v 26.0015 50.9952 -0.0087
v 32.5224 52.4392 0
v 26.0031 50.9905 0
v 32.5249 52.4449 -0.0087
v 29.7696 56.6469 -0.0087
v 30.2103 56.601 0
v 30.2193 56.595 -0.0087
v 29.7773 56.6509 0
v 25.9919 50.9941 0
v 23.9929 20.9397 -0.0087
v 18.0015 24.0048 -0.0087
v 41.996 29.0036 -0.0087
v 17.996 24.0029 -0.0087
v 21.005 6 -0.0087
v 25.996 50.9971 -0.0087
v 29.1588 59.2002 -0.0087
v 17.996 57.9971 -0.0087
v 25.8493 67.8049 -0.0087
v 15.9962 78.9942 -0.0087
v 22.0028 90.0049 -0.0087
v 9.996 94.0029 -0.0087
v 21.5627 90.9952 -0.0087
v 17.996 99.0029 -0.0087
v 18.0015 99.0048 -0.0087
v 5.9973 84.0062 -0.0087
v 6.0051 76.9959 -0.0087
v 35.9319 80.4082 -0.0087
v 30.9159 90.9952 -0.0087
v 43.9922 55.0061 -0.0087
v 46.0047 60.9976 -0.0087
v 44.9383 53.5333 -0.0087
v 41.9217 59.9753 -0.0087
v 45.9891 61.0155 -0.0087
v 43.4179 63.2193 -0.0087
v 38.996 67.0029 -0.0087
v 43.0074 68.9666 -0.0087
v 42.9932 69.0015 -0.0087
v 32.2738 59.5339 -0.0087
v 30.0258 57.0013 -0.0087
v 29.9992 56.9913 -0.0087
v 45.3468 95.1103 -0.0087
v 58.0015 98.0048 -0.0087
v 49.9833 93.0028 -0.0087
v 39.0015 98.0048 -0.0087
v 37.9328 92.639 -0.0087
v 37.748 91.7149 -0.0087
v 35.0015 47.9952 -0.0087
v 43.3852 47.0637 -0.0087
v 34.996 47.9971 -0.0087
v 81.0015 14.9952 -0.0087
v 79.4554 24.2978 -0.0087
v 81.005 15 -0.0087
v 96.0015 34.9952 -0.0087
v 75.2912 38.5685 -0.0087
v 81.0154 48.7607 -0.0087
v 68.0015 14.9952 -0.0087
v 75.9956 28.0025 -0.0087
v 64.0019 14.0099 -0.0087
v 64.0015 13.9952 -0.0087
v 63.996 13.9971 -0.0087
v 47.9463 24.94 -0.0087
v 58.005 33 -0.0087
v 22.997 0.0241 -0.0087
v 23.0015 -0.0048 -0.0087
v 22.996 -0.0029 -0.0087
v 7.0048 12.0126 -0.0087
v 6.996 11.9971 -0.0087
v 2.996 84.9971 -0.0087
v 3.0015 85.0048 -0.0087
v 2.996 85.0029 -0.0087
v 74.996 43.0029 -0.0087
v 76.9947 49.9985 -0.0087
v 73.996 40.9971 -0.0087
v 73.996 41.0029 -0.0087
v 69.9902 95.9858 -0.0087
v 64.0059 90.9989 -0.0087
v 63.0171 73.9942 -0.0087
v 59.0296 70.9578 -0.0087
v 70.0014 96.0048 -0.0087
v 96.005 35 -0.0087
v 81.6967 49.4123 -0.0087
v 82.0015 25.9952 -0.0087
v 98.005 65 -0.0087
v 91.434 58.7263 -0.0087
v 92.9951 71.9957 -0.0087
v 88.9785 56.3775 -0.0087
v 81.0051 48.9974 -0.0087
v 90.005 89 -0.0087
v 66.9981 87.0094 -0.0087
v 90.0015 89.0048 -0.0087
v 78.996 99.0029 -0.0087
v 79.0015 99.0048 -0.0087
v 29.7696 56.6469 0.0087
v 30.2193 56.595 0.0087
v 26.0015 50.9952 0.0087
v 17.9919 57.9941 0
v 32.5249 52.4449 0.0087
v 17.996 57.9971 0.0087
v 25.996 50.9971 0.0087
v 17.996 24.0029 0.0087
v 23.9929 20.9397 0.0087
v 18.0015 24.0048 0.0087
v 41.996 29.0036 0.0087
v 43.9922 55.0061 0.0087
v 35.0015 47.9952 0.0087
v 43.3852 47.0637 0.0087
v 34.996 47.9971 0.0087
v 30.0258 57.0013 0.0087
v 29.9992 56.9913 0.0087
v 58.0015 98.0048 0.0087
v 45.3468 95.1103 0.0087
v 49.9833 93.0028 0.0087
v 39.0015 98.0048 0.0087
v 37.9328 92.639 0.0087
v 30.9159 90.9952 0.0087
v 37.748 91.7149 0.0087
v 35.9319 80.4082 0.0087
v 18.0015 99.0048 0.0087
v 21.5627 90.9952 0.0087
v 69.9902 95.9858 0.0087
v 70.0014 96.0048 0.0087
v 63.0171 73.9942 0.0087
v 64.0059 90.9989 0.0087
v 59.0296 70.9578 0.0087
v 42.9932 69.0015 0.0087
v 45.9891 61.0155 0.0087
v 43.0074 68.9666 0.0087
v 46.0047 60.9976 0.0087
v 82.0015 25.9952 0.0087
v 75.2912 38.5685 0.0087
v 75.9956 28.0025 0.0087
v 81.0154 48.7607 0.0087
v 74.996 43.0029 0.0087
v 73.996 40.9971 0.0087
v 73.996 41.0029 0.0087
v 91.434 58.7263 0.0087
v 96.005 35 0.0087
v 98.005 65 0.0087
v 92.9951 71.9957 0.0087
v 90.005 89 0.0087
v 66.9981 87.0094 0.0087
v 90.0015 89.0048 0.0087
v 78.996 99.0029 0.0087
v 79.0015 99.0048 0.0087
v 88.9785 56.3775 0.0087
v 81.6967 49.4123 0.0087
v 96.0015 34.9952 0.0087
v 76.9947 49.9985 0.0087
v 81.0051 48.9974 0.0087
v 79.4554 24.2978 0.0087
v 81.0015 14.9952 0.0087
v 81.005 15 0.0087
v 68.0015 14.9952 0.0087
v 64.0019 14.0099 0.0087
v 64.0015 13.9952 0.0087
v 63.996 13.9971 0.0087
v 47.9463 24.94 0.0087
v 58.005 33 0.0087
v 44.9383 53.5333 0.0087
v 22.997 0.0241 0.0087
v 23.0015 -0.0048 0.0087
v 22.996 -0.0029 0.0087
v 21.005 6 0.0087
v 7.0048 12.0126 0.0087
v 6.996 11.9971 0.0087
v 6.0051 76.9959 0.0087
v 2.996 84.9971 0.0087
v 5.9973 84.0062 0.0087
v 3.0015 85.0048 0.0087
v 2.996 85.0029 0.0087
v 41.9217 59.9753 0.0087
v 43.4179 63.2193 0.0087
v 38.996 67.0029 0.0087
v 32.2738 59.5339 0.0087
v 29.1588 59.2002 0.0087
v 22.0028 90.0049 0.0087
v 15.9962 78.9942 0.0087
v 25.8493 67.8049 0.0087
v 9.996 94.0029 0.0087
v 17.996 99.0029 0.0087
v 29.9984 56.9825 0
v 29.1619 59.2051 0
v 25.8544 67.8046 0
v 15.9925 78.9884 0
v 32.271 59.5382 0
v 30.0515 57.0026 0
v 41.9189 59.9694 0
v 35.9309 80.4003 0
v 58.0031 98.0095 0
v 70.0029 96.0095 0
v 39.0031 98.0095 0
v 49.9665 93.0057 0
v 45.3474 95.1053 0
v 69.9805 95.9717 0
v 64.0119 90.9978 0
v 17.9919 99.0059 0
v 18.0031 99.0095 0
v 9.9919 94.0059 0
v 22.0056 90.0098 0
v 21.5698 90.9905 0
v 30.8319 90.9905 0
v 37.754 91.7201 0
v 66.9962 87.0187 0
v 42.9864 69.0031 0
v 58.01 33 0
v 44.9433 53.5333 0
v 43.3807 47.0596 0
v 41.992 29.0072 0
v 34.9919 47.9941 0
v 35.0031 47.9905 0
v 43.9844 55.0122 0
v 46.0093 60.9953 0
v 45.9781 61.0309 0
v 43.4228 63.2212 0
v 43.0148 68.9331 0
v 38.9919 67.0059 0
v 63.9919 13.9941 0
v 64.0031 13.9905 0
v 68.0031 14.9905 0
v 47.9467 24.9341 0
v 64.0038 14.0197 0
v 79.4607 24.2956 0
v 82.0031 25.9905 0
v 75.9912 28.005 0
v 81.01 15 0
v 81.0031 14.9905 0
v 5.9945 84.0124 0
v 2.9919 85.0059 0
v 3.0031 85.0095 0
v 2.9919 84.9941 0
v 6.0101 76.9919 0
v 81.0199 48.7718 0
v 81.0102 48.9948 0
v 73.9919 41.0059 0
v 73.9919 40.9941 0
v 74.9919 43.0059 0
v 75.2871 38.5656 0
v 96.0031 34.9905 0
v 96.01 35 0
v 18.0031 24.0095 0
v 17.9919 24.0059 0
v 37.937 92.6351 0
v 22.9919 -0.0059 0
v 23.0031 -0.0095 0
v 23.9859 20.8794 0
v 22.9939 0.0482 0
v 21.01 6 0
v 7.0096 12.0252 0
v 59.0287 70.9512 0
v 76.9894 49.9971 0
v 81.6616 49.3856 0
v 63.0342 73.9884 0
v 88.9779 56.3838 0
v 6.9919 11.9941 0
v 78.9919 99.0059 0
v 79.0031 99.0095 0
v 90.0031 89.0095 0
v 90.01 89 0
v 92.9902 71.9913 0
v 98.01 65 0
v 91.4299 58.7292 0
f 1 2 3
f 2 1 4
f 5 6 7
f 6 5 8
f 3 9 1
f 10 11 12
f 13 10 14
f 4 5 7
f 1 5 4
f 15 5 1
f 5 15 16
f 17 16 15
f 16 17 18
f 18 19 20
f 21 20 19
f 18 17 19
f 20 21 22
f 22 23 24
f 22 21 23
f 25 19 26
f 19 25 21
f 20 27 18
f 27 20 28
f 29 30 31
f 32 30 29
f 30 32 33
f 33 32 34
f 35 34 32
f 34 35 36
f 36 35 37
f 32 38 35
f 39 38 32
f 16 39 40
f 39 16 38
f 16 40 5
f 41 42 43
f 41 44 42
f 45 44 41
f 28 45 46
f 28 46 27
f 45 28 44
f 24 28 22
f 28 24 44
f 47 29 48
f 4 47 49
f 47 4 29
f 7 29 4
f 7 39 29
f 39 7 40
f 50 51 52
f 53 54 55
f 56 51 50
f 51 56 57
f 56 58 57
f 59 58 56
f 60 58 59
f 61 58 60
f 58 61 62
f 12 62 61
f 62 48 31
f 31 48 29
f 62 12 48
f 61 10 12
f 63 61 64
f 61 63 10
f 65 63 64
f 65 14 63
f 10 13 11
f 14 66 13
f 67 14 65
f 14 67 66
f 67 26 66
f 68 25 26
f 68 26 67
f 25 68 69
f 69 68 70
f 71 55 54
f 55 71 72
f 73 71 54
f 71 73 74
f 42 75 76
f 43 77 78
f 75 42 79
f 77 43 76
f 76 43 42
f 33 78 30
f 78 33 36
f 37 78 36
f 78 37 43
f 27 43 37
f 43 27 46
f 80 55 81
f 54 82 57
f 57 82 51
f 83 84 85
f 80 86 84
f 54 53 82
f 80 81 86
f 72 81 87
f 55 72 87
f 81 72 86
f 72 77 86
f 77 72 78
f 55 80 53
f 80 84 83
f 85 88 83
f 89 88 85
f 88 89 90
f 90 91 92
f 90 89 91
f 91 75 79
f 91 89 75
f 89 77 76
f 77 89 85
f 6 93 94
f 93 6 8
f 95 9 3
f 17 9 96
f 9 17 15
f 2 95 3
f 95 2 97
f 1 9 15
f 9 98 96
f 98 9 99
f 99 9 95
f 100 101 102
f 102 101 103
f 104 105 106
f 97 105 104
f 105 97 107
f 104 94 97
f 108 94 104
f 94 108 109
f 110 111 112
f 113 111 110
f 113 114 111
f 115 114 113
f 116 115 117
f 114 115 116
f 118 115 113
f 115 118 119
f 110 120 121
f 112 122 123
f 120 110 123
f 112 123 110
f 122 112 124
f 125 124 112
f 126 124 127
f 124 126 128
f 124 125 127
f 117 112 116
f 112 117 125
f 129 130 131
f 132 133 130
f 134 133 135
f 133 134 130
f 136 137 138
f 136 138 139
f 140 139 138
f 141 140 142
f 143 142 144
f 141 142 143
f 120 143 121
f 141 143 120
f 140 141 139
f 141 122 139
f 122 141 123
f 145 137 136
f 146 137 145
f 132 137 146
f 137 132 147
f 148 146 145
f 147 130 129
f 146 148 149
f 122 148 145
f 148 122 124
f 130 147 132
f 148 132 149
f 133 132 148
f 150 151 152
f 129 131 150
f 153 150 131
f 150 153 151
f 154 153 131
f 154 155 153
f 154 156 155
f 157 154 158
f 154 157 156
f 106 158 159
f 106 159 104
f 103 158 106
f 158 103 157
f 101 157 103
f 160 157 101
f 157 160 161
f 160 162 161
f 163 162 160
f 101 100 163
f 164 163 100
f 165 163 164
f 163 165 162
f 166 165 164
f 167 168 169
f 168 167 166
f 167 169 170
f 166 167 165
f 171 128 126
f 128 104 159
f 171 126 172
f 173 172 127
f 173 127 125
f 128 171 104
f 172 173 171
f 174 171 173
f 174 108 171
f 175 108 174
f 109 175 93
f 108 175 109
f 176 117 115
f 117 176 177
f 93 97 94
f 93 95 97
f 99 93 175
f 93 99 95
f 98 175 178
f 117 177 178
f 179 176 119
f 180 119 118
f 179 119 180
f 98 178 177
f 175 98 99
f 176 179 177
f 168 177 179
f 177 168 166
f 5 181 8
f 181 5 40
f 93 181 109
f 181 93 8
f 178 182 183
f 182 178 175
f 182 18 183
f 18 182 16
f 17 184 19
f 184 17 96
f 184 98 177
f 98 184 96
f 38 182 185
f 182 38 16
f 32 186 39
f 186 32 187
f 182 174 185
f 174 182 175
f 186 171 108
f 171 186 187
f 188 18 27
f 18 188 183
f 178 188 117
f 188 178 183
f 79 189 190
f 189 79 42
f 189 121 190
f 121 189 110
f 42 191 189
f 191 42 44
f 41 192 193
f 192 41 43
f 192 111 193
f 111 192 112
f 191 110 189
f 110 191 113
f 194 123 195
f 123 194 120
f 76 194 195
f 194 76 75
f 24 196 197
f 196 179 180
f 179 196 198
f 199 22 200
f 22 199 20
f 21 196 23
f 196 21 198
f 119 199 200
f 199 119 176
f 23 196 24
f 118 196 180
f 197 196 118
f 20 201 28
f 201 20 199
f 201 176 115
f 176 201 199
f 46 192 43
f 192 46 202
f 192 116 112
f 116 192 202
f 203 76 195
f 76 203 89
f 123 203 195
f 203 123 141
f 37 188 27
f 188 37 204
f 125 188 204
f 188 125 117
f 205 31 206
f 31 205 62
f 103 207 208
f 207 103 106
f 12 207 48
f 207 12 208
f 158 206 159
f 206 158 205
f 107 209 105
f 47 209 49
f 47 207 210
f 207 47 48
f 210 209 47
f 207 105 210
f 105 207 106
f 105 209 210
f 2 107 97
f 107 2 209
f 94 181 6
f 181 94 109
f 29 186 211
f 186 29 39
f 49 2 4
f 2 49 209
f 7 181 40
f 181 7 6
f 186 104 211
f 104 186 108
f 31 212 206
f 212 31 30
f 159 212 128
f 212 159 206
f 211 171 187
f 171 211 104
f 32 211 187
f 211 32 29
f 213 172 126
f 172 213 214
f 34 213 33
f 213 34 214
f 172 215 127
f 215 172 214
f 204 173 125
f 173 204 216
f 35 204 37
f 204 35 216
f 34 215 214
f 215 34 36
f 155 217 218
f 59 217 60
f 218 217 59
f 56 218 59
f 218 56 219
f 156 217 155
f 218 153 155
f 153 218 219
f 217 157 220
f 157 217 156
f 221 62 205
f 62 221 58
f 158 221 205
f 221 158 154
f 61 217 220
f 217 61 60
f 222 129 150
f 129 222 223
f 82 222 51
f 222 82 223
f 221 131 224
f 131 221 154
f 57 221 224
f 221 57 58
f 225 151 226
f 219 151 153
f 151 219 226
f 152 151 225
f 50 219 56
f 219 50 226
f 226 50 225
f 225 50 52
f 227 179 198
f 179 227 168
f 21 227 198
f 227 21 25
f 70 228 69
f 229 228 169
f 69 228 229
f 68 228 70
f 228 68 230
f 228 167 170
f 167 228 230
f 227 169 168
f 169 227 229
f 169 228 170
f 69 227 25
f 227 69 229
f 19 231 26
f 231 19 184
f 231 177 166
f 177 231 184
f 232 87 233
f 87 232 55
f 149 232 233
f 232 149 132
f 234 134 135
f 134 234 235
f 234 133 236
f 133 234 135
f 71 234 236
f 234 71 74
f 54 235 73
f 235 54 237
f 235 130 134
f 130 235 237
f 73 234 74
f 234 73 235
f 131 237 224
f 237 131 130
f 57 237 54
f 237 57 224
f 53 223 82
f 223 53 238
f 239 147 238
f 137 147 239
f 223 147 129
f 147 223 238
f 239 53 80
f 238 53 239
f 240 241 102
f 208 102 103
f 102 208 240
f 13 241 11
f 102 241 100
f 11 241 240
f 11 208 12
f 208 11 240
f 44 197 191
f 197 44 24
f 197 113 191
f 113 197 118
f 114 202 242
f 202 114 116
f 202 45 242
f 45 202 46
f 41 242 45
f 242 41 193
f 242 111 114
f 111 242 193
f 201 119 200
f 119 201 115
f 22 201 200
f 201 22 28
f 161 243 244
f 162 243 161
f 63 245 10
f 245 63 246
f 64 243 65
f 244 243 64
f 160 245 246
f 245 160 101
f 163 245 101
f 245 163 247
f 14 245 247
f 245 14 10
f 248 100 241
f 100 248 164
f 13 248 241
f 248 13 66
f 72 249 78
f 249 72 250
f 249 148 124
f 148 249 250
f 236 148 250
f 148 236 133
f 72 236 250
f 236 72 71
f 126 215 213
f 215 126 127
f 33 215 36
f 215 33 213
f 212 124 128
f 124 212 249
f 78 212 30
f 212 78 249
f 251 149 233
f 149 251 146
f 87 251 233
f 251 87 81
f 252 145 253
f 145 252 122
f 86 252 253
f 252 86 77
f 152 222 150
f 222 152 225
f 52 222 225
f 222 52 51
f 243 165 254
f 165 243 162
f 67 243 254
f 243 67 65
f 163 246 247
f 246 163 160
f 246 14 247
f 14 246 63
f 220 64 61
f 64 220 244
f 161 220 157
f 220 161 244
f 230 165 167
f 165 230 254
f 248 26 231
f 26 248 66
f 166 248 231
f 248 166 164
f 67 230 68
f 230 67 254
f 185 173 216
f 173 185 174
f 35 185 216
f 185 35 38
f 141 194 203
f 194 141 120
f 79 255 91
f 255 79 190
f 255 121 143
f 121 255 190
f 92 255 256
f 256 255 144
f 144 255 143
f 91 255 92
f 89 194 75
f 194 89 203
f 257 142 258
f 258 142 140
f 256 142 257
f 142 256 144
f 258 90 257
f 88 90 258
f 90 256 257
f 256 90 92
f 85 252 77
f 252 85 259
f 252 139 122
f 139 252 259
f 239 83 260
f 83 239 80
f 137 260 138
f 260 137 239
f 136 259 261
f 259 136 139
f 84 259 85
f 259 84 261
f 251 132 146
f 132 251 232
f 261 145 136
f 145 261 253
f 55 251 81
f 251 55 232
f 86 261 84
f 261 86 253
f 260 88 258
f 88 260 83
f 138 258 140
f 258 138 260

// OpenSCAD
color([0.592053202978914,0.7602792343344718,0.23214841748979886]) hull(){
    translate([18,58]) sphere(0.01);
    translate([44,55]) sphere(0.01);
    translate([26,51]) sphere(0.01);
}
color([0.2215781656479593,0.24536616409996503,0.7021925659500807]) hull(){
    translate([18,58]) sphere(0.01);
    translate([26,51]) sphere(0.01);
    translate([30,57]) sphere(0.01);
}
color([0.5457605096294114,0.54011508338913,0.5459453680001618]) hull(){
    translate([18,58]) sphere(0.01);
    translate([20,83]) sphere(0.01);
    translate([30,57]) sphere(0.01);
}
color([0.21439919344985514,0.4167057873106884,0.6193494045718565]) hull(){
    translate([18,58]) sphere(0.01);
    translate([20,83]) sphere(0.01);
    translate([16,79]) sphere(0.01);
}
color([0.45760594266221877,0.8933837090972113,0.8109172526149769]) hull(){
    translate([18,58]) sphere(0.01);
    translate([30,57]) sphere(0.01);
    translate([46,61]) sphere(0.01);
}
color([0.14833972802097417,0.6068004170768148,0.5080529466064481]) hull(){
    translate([18,58]) sphere(0.01);
    translate([16,79]) sphere(0.01);
    translate([38,83]) sphere(0.01);
}
color([0.9906187087676633,0.11352393843166497,0.6883720652754897]) hull(){
    translate([18,58]) sphere(0.01);
    translate([38,83]) sphere(0.01);
    translate([20,83]) sphere(0.01);
}
color([0.5952346609945763,0.6540807806784664,0.3474259839548979]) hull(){
    translate([58,98]) sphere(0.01);
    translate([50,93]) sphere(0.01);
    translate([70,96]) sphere(0.01);
}
color([0.9928586924360654,0.247192741454632,0.70975753974483]) hull(){
    translate([58,98]) sphere(0.01);
    translate([50,93]) sphere(0.01);
    translate([64,91]) sphere(0.01);
}
color([0.13794757021236903,0.4611444179186315,0.04899626755467579]) hull(){
    translate([58,98]) sphere(0.01);
    translate([39,98]) sphere(0.01);
    translate([50,93]) sphere(0.01);
}
color([0.1977229983916683,0.036370797334404625,0.13840798504488894]) hull(){
    translate([58,98]) sphere(0.01);
    translate([70,96]) sphere(0.01);
    translate([64,91]) sphere(0.01);
}
color([0.695134065044521,0.2654011745990712,0.4635417367699751]) hull(){
    translate([58,98]) sphere(0.01);
    translate([51,97]) sphere(0.01);
    translate([50,93]) sphere(0.01);
}
color([0.14067843926211876,0.3233092624720053,0.6766209265725885]) hull(){
    translate([58,98]) sphere(0.01);
    translate([51,97]) sphere(0.01);
    translate([39,98]) sphere(0.01);
}
color([0.5598941248919586,0.2674263193966361,0.7715367321750608]) hull(){
    translate([22,90]) sphere(0.01);
    translate([20,83]) sphere(0.01);
    translate([38,83]) sphere(0.01);
}
color([0.7775867750177572,0.3358457771023752,0.7984986383285079]) hull(){
    translate([22,90]) sphere(0.01);
    translate([18,99]) sphere(0.01);
    translate([10,94]) sphere(0.01);
}
color([0.3608344962449672,0.130636609727118,0.1470050456404287]) hull(){
    translate([22,90]) sphere(0.01);
    translate([31,91]) sphere(0.01);
    translate([37,88]) sphere(0.01);
}
color([0.5817121628313788,0.46286602772829477,0.8824527290015699]) hull(){
    translate([22,90]) sphere(0.01);
    translate([37,88]) sphere(0.01);
    translate([38,83]) sphere(0.01);
}
color([0.1201105517589024,0.1938197880719691,0.4695931850983104]) hull(){
    translate([22,90]) sphere(0.01);
    translate([38,83]) sphere(0.01);
    translate([20,83]) sphere(0.01);
}
color([0.14078313852784263,0.6451769219884874,0.9811903017448982]) hull(){
    translate([22,90]) sphere(0.01);
    translate([38,83]) sphere(0.01);
    translate([30,90]) sphere(0.01);
}
color([0.8740229692652243,0.6541461711493592,0.21289315855754942]) hull(){
    translate([22,90]) sphere(0.01);
    translate([30,90]) sphere(0.01);
    translate([31,91]) sphere(0.01);
}
color([0.9328418457966335,0.42345059226773774,0.5012376899041451]) hull(){
    translate([50,93]) sphere(0.01);
    translate([31,91]) sphere(0.01);
    translate([37,88]) sphere(0.01);
}
color([0.5811541702347708,0.2791891573101454,0.2092311813057095]) hull(){
    translate([50,93]) sphere(0.01);
    translate([64,91]) sphere(0.01);
    translate([67,87]) sphere(0.01);
}
color([0.9628933046967749,0.6198760626942967,0.5999578261672418]) hull(){
    translate([50,93]) sphere(0.01);
    translate([37,88]) sphere(0.01);
    translate([30,90]) sphere(0.01);
}
color([0.23874719597172656,0.5159213977515871,0.8042715508319355]) hull(){
    translate([50,93]) sphere(0.01);
    translate([67,87]) sphere(0.01);
    translate([64,91]) sphere(0.01);
}
color([0.6755197251802578,0.41487488756696345,0.5733633065217538]) hull(){
    translate([50,93]) sphere(0.01);
    translate([67,87]) sphere(0.01);
    translate([63,74]) sphere(0.01);
}
color([0.8352652083788017,0.4789645616530247,0.8888242662849705]) hull(){
    translate([50,93]) sphere(0.01);
    translate([43,69]) sphere(0.01);
    translate([37,88]) sphere(0.01);
}
color([0.7977003312522131,0.4430245559395397,0.5757872208285841]) hull(){
    translate([50,93]) sphere(0.01);
    translate([43,69]) sphere(0.01);
    translate([30,90]) sphere(0.01);
}
color([0.18894415855786206,0.8084526775944827,0.5240727557148024]) hull(){
    translate([50,93]) sphere(0.01);
    translate([63,74]) sphere(0.01);
    translate([43,69]) sphere(0.01);
}
color([0.33009817895383553,0.6358447971330878,0.274476683198677]) hull(){
    translate([44,55]) sphere(0.01);
    translate([58,33]) sphere(0.01);
    translate([42,29]) sphere(0.01);
}
color([0.7036882936284021,0.9548751840233447,0.5755708060880032]) hull(){
    translate([44,55]) sphere(0.01);
    translate([58,33]) sphere(0.01);
    translate([44,47]) sphere(0.01);
}
color([0.41204698353559877,0.5796286851254486,0.28286322414623355]) hull(){
    translate([44,55]) sphere(0.01);
    translate([42,29]) sphere(0.01);
    translate([44,47]) sphere(0.01);
}
color([0.83488960487533,0.7968053445508819,0.9111606805714901]) hull(){
    translate([44,55]) sphere(0.01);
    translate([44,47]) sphere(0.01);
    translate([35,48]) sphere(0.01);
}
color([0.24277728252059738,0.2698201644401115,0.25372921938475945]) hull(){
    translate([44,55]) sphere(0.01);
    translate([44,47]) sphere(0.01);
    translate([45,42]) sphere(0.01);
}
color([0.3248429479181304,0.33731838939050207,0.46012102584031667]) hull(){
    translate([44,55]) sphere(0.01);
    translate([35,48]) sphere(0.01);
    translate([30,57]) sphere(0.01);
}
color([0.4972140619467261,0.4460540182101679,0.582257111213957]) hull(){
    translate([44,55]) sphere(0.01);
    translate([46,61]) sphere(0.01);
    translate([44,47]) sphere(0.01);
}
color([0.38189019333285656,0.9329183366158048,0.74346568951076]) hull(){
    translate([44,55]) sphere(0.01);
    translate([46,61]) sphere(0.01);
    translate([39,67]) sphere(0.01);
}
color([0.10367473231816282,0.6513301228797536,0.21210212161149367]) hull(){
    translate([44,55]) sphere(0.01);
    translate([39,67]) sphere(0.01);
    translate([43,69]) sphere(0.01);
}
color([0.4071949612628585,0.6715659813617996,0.17871221391606673]) hull(){
    translate([64,14]) sphere(0.01);
    translate([68,15]) sphere(0.01);
    translate([72,20]) sphere(0.01);
}
color([0.17752412341011714,0.6556599876579107,0.7040052939421468]) hull(){
    translate([64,14]) sphere(0.01);
    translate([58,33]) sphere(0.01);
    translate([42,29]) sphere(0.01);
}
color([0.9236087761692187,0.21340315940002685,0.5989435772305987]) hull(){
    translate([64,14]) sphere(0.01);
    translate([82,26]) sphere(0.01);
    translate([72,20]) sphere(0.01);
}
color([0.8450733127471588,0.6003349610680997,0.5954496070156984]) hull(){
    translate([64,14]) sphere(0.01);
    translate([82,26]) sphere(0.01);
    translate([76,28]) sphere(0.01);
}
color([0.920709623693076,0.4233833186292486,0.4754938941291812]) hull(){
    translate([64,14]) sphere(0.01);
    translate([42,29]) sphere(0.01);
    translate([58,33]) sphere(0.01);
}
color([0.872421437716006,0.9767589381362137,0.9086126193256788]) hull(){
    translate([64,14]) sphere(0.01);
    translate([76,28]) sphere(0.01);
    translate([82,26]) sphere(0.01);
}
color([0.7884233486788577,0.8262914624918754,0.6636415038118221]) hull(){
    translate([68,15]) sphere(0.01);
    translate([81,15]) sphere(0.01);
    translate([72,20]) sphere(0.01);
}
color([0.36270118963089737,0.5138414630226216,0.14357255994509865]) hull(){
    translate([10,94]) sphere(0.01);
    translate([6,84]) sphere(0.01);
    translate([18,99]) sphere(0.01);
}
color([0.466624584989368,0.29734697142143796,0.9844700368526675]) hull(){
    translate([10,94]) sphere(0.01);
    translate([6,84]) sphere(0.01);
    translate([16,79]) sphere(0.01);
}
color([0.6752891164641136,0.29017518075598103,0.4342964607752302]) hull(){
    translate([10,94]) sphere(0.01);
    translate([20,83]) sphere(0.01);
    translate([16,79]) sphere(0.01);
}
color([0.773003957160343,0.565247166210502,0.9239404304157245]) hull(){
    translate([10,94]) sphere(0.01);
    translate([20,83]) sphere(0.01);
    translate([22,90]) sphere(0.01);
}
color([0.16032310979410902,0.8355206000915061,0.5688487402091276]) hull(){
    translate([10,94]) sphere(0.01);
    translate([18,99]) sphere(0.01);
    translate([22,90]) sphere(0.01);
}
color([0.20030491603062106,0.9799112189115262,0.7788088383598656]) hull(){
    translate([6,84]) sphere(0.01);
    translate([3,85]) sphere(0.01);
    translate([16,79]) sphere(0.01);
}
color([0.3331229107175697,0.956723341350572,0.8892995412421422]) hull(){
    translate([6,84]) sphere(0.01);
    translate([16,79]) sphere(0.01);
    translate([6,77]) sphere(0.01);
}
color([0.9938355783742772,0.5564778243748569,0.9329279768345969]) hull(){
    translate([6,84]) sphere(0.01);
    translate([6,77]) sphere(0.01);
    translate([3,85]) sphere(0.01);
}
color([0.35340897744289224,0.12062022214202717,0.7238287945893779]) hull(){
    translate([82,26]) sphere(0.01);
    translate([81,49]) sphere(0.01);
    translate([76,28]) sphere(0.01);
}
color([0.8432397019629626,0.2883830928152321,0.23139986036280558]) hull(){
    translate([82,26]) sphere(0.01);
    translate([75,43]) sphere(0.01);
    translate([74,41]) sphere(0.01);
}
color([0.0180364627349191,0.35314011923198985,0.9589424474672257]) hull(){
    translate([82,26]) sphere(0.01);
    translate([75,43]) sphere(0.01);
    translate([76,28]) sphere(0.01);
}
color([0.2619290021782883,0.20369548429490625,0.5420815487250377]) hull(){
    translate([82,26]) sphere(0.01);
    translate([74,41]) sphere(0.01);
    translate([81,49]) sphere(0.01);
}
color([0.9221305525684157,0.837748898711002,0.8622867035840079]) hull(){
    translate([82,26]) sphere(0.01);
    translate([96,35]) sphere(0.01);
    translate([75,43]) sphere(0.01);
}
color([0.727429224436118,0.821332708873966,0.2567577523046298]) hull(){
    translate([42,29]) sphere(0.01);
    translate([26,22]) sphere(0.01);
    translate([18,24]) sphere(0.01);
}
color([0.1353372895865157,0.7613019869252476,0.15437996216449157]) hull(){
    translate([42,29]) sphere(0.01);
    translate([26,22]) sphere(0.01);
    translate([32,18]) sphere(0.01);
}
color([0.5724302025923821,0.22728732004270547,0.8377719495956792]) hull(){
    translate([42,29]) sphere(0.01);
    translate([18,24]) sphere(0.01);
    translate([24,21]) sphere(0.01);
}
color([0.3661955888727618,0.7135191579002272,0.515047468161266]) hull(){
    translate([42,29]) sphere(0.01);
    translate([24,21]) sphere(0.01);
    translate([26,22]) sphere(0.01);
}
color([0.13764795316468892,0.40448573996937276,0.8917260836787828]) hull(){
    translate([42,29]) sphere(0.01);
    translate([55,32]) sphere(0.01);
    translate([58,33]) sphere(0.01);
}
color([0.7643233656004556,0.5236824296690593,0.15029798138806982]) hull(){
    translate([42,29]) sphere(0.01);
    translate([32,18]) sphere(0.01);
    translate([55,32]) sphere(0.01);
}
color([0.9580407420374472,0.6000911555631969,0.025324835711835636]) hull(){
    translate([39,98]) sphere(0.01);
    translate([18,99]) sphere(0.01);
    translate([15,91]) sphere(0.01);
}
color([0.8628581448400192,0.48332959823715915,0.760144685355809]) hull(){
    translate([39,98]) sphere(0.01);
    translate([31,91]) sphere(0.01);
    translate([30,90]) sphere(0.01);
}
color([0.17349489212301172,0.7172022627612936,0.8738126079333703]) hull(){
    translate([39,98]) sphere(0.01);
    translate([37,88]) sphere(0.01);
    translate([31,91]) sphere(0.01);
}
color([0.7407081150283871,0.1750257628023656,0.7717601752613227]) hull(){
    translate([39,98]) sphere(0.01);
    translate([51,97]) sphere(0.01);
    translate([31,91]) sphere(0.01);
}
color([0.17462951192396858,0.1365817917740666,0.790898096633715]) hull(){
    translate([39,98]) sphere(0.01);
    translate([51,97]) sphere(0.01);
    translate([30,90]) sphere(0.01);
}
color([0.05068813004758421,0.2747417086491215,0.9775332998919624]) hull(){
    translate([39,98]) sphere(0.01);
    translate([15,91]) sphere(0.01);
    translate([31,91]) sphere(0.01);
}
color([0.3741990821064618,0.5760507248775137,0.9764706525564496]) hull(){
    translate([26,22]) sphere(0.01);
    translate([23,0]) sphere(0.01);
    translate([24,21]) sphere(0.01);
}
color([0.6412339051880062,0.9116486495874845,0.653753263894704]) hull(){
    translate([26,22]) sphere(0.01);
    translate([23,0]) sphere(0.01);
    translate([32,18]) sphere(0.01);
}
color([0.7391387592304974,0.7973855488942889,0.8338139774032114]) hull(){
    translate([18,24]) sphere(0.01);
    translate([24,21]) sphere(0.01);
    translate([21,6]) sphere(0.01);
}
color([0.5893068505654989,0.9387852932083598,0.6768105799142914]) hull(){
    translate([18,24]) sphere(0.01);
    translate([7,12]) sphere(0.01);
    translate([21,6]) sphere(0.01);
}
color([0.26314077483765086,0.6459233453457565,0.8790980253849315]) hull(){
    translate([80,52]) sphere(0.01);
    translate([59,71]) sphere(0.01);
    translate([77,50]) sphere(0.01);
}
color([0.15362837418895858,0.31061588741770185,0.8944360920803668]) hull(){
    translate([80,52]) sphere(0.01);
    translate([59,71]) sphere(0.01);
    translate([81,49]) sphere(0.01);
}
color([0.2723573567519545,0.029723278769515638,0.14137415559711708]) hull(){
    translate([80,52]) sphere(0.01);
    translate([77,50]) sphere(0.01);
    translate([81,49]) sphere(0.01);
}
color([0.24588268133825053,0.688989335517289,0.012833732972479917]) hull(){
    translate([80,52]) sphere(0.01);
    translate([77,50]) sphere(0.01);
    translate([75,43]) sphere(0.01);
}
color([0.4317421186444177,0.09476467904542085,0.2539030370426648]) hull(){
    translate([80,52]) sphere(0.01);
    translate([81,49]) sphere(0.01);
    translate([74,41]) sphere(0.01);
}
color([0.4433940275438375,0.6374619106411259,0.7629796076056016]) hull(){
    translate([80,52]) sphere(0.01);
    translate([75,43]) sphere(0.01);
    translate([74,41]) sphere(0.01);
}
color([0.33974962563874156,0.40746011996126574,0.8304662499681598]) hull(){
    translate([59,71]) sphere(0.01);
    translate([77,50]) sphere(0.01);
    translate([81,49]) sphere(0.01);
}
color([0.03737370743548629,0.7771030741686201,0.7450583503430228]) hull(){
    translate([59,71]) sphere(0.01);
    translate([67,87]) sphere(0.01);
    translate([63,74]) sphere(0.01);
}
color([0.7664898273962963,0.9635930682622835,0.37370940745190284]) hull(){
    translate([59,71]) sphere(0.01);
    translate([43,69]) sphere(0.01);
    translate([63,74]) sphere(0.01);
}
color([0.5269890278256799,0.7391003970289415,0.05440955639390033]) hull(){
    translate([59,71]) sphere(0.01);
    translate([46,61]) sphere(0.01);
    translate([43,69]) sphere(0.01);
}
color([0.16266859334294614,0.5860851836586503,0.6198514899274227]) hull(){
    translate([59,71]) sphere(0.01);
    translate([46,61]) sphere(0.01);
    translate([63,74]) sphere(0.01);
}
color([0.617768007375954,0.696939114622172,0.24987298892689824]) hull(){
    translate([59,71]) sphere(0.01);
    translate([91,55]) sphere(0.01);
    translate([77,50]) sphere(0.01);
}
color([0.10727882524928667,0.2542017095222042,0.647326061070541]) hull(){
    translate([59,71]) sphere(0.01);
    translate([91,55]) sphere(0.01);
    translate([81,49]) sphere(0.01);
}
color([0.6145129037504997,0.7319188036610002,0.2916410122362264]) hull(){
    translate([59,71]) sphere(0.01);
    translate([91,55]) sphere(0.01);
    translate([63,74]) sphere(0.01);
}
color([0.46410792523938205,0.009432899408237327,0.2601511175245954]) hull(){
    translate([81,15]) sphere(0.01);
    translate([72,20]) sphere(0.01);
    translate([79,27]) sphere(0.01);
}
color([0.9661595458779266,0.8212204941997756,0.9717572370221306]) hull(){
    translate([81,15]) sphere(0.01);
    translate([76,28]) sphere(0.01);
    translate([79,27]) sphere(0.01);
}
color([0.7094339661906762,0.3687560915635114,0.91551222113324]) hull(){
    translate([23,0]) sphere(0.01);
    translate([7,12]) sphere(0.01);
    translate([21,6]) sphere(0.01);
}
color([0.32058638357595914,0.6286861798780845,0.3438006598659582]) hull(){
    translate([23,0]) sphere(0.01);
    translate([32,18]) sphere(0.01);
    translate([55,32]) sphere(0.01);
}
color([0.6764002586894835,0.49002609359593985,0.6828992283474875]) hull(){
    translate([3,85]) sphere(0.01);
    translate([6,77]) sphere(0.01);
    translate([7,12]) sphere(0.01);
}
color([0.9457740861038292,0.48113916365283227,0.11743485119222763]) hull(){
    translate([30,57]) sphere(0.01);
    translate([46,61]) sphere(0.01);
    translate([39,67]) sphere(0.01);
}
color([0.6785611781392669,0.3559530637070777,0.24479389591231593]) hull(){
    translate([70,96]) sphere(0.01);
    translate([79,99]) sphere(0.01);
    translate([67,87]) sphere(0.01);
}
color([0.19718264729666257,0.5265513877214916,0.7820972605832109]) hull(){
    translate([70,96]) sphere(0.01);
    translate([67,87]) sphere(0.01);
    translate([83,95]) sphere(0.01);
}
color([0.016540899859545988,0.2649906914184337,0.6195666266963675]) hull(){
    translate([70,96]) sphere(0.01);
    translate([83,95]) sphere(0.01);
    translate([79,99]) sphere(0.01);
}
color([0.9400622663204184,0.8580807518186289,0.33004078082379396]) hull(){
    translate([79,99]) sphere(0.01);
    translate([90,89]) sphere(0.01);
    translate([67,87]) sphere(0.01);
}
color([0.9838273149753736,0.1297919343219498,0.6092048694604357]) hull(){
    translate([79,99]) sphere(0.01);
    translate([90,89]) sphere(0.01);
    translate([83,95]) sphere(0.01);
}
color([0.4362496777237921,0.204876863896859,0.7703581377154641]) hull(){
    translate([67,87]) sphere(0.01);
    translate([63,74]) sphere(0.01);
    translate([90,89]) sphere(0.01);
}
color([0.24016059236570497,0.9925708955515705,0.45030012798788]) hull(){
    translate([67,87]) sphere(0.01);
    translate([90,89]) sphere(0.01);
    translate([93,72]) sphere(0.01);
}
color([0.6687095525163839,0.6084946124880205,0.9354113971140408]) hull(){
    translate([67,87]) sphere(0.01);
    translate([93,72]) sphere(0.01);
    translate([63,74]) sphere(0.01);
}
color([0.40170597484563164,0.9257642462472301,0.7352475143256585]) hull(){
    translate([91,55]) sphere(0.01);
    translate([98,65]) sphere(0.01);
    translate([96,35]) sphere(0.01);
}
color([0.9040805991886998,0.8303556425691195,0.04360117165228117]) hull(){
    translate([91,55]) sphere(0.01);
    translate([98,65]) sphere(0.01);
    translate([93,72]) sphere(0.01);
}
color([0.19461635406133904,0.24937487606759356,0.948798389089598]) hull(){
    translate([91,55]) sphere(0.01);
    translate([96,35]) sphere(0.01);
    translate([93,72]) sphere(0.01);
}
color([0.463582495028668,0.8326751819056648,0.9518902994268229]) hull(){
    translate([98,65]) sphere(0.01);
    translate([96,35]) sphere(0.01);
    translate([75,43]) sphere(0.01);
}
color([0.6590575290507751,0.08125165305796267,0.4650668984349794]) hull(){
    translate([98,65]) sphere(0.01);
    translate([93,72]) sphere(0.01);
    translate([90,89]) sphere(0.01);
}
